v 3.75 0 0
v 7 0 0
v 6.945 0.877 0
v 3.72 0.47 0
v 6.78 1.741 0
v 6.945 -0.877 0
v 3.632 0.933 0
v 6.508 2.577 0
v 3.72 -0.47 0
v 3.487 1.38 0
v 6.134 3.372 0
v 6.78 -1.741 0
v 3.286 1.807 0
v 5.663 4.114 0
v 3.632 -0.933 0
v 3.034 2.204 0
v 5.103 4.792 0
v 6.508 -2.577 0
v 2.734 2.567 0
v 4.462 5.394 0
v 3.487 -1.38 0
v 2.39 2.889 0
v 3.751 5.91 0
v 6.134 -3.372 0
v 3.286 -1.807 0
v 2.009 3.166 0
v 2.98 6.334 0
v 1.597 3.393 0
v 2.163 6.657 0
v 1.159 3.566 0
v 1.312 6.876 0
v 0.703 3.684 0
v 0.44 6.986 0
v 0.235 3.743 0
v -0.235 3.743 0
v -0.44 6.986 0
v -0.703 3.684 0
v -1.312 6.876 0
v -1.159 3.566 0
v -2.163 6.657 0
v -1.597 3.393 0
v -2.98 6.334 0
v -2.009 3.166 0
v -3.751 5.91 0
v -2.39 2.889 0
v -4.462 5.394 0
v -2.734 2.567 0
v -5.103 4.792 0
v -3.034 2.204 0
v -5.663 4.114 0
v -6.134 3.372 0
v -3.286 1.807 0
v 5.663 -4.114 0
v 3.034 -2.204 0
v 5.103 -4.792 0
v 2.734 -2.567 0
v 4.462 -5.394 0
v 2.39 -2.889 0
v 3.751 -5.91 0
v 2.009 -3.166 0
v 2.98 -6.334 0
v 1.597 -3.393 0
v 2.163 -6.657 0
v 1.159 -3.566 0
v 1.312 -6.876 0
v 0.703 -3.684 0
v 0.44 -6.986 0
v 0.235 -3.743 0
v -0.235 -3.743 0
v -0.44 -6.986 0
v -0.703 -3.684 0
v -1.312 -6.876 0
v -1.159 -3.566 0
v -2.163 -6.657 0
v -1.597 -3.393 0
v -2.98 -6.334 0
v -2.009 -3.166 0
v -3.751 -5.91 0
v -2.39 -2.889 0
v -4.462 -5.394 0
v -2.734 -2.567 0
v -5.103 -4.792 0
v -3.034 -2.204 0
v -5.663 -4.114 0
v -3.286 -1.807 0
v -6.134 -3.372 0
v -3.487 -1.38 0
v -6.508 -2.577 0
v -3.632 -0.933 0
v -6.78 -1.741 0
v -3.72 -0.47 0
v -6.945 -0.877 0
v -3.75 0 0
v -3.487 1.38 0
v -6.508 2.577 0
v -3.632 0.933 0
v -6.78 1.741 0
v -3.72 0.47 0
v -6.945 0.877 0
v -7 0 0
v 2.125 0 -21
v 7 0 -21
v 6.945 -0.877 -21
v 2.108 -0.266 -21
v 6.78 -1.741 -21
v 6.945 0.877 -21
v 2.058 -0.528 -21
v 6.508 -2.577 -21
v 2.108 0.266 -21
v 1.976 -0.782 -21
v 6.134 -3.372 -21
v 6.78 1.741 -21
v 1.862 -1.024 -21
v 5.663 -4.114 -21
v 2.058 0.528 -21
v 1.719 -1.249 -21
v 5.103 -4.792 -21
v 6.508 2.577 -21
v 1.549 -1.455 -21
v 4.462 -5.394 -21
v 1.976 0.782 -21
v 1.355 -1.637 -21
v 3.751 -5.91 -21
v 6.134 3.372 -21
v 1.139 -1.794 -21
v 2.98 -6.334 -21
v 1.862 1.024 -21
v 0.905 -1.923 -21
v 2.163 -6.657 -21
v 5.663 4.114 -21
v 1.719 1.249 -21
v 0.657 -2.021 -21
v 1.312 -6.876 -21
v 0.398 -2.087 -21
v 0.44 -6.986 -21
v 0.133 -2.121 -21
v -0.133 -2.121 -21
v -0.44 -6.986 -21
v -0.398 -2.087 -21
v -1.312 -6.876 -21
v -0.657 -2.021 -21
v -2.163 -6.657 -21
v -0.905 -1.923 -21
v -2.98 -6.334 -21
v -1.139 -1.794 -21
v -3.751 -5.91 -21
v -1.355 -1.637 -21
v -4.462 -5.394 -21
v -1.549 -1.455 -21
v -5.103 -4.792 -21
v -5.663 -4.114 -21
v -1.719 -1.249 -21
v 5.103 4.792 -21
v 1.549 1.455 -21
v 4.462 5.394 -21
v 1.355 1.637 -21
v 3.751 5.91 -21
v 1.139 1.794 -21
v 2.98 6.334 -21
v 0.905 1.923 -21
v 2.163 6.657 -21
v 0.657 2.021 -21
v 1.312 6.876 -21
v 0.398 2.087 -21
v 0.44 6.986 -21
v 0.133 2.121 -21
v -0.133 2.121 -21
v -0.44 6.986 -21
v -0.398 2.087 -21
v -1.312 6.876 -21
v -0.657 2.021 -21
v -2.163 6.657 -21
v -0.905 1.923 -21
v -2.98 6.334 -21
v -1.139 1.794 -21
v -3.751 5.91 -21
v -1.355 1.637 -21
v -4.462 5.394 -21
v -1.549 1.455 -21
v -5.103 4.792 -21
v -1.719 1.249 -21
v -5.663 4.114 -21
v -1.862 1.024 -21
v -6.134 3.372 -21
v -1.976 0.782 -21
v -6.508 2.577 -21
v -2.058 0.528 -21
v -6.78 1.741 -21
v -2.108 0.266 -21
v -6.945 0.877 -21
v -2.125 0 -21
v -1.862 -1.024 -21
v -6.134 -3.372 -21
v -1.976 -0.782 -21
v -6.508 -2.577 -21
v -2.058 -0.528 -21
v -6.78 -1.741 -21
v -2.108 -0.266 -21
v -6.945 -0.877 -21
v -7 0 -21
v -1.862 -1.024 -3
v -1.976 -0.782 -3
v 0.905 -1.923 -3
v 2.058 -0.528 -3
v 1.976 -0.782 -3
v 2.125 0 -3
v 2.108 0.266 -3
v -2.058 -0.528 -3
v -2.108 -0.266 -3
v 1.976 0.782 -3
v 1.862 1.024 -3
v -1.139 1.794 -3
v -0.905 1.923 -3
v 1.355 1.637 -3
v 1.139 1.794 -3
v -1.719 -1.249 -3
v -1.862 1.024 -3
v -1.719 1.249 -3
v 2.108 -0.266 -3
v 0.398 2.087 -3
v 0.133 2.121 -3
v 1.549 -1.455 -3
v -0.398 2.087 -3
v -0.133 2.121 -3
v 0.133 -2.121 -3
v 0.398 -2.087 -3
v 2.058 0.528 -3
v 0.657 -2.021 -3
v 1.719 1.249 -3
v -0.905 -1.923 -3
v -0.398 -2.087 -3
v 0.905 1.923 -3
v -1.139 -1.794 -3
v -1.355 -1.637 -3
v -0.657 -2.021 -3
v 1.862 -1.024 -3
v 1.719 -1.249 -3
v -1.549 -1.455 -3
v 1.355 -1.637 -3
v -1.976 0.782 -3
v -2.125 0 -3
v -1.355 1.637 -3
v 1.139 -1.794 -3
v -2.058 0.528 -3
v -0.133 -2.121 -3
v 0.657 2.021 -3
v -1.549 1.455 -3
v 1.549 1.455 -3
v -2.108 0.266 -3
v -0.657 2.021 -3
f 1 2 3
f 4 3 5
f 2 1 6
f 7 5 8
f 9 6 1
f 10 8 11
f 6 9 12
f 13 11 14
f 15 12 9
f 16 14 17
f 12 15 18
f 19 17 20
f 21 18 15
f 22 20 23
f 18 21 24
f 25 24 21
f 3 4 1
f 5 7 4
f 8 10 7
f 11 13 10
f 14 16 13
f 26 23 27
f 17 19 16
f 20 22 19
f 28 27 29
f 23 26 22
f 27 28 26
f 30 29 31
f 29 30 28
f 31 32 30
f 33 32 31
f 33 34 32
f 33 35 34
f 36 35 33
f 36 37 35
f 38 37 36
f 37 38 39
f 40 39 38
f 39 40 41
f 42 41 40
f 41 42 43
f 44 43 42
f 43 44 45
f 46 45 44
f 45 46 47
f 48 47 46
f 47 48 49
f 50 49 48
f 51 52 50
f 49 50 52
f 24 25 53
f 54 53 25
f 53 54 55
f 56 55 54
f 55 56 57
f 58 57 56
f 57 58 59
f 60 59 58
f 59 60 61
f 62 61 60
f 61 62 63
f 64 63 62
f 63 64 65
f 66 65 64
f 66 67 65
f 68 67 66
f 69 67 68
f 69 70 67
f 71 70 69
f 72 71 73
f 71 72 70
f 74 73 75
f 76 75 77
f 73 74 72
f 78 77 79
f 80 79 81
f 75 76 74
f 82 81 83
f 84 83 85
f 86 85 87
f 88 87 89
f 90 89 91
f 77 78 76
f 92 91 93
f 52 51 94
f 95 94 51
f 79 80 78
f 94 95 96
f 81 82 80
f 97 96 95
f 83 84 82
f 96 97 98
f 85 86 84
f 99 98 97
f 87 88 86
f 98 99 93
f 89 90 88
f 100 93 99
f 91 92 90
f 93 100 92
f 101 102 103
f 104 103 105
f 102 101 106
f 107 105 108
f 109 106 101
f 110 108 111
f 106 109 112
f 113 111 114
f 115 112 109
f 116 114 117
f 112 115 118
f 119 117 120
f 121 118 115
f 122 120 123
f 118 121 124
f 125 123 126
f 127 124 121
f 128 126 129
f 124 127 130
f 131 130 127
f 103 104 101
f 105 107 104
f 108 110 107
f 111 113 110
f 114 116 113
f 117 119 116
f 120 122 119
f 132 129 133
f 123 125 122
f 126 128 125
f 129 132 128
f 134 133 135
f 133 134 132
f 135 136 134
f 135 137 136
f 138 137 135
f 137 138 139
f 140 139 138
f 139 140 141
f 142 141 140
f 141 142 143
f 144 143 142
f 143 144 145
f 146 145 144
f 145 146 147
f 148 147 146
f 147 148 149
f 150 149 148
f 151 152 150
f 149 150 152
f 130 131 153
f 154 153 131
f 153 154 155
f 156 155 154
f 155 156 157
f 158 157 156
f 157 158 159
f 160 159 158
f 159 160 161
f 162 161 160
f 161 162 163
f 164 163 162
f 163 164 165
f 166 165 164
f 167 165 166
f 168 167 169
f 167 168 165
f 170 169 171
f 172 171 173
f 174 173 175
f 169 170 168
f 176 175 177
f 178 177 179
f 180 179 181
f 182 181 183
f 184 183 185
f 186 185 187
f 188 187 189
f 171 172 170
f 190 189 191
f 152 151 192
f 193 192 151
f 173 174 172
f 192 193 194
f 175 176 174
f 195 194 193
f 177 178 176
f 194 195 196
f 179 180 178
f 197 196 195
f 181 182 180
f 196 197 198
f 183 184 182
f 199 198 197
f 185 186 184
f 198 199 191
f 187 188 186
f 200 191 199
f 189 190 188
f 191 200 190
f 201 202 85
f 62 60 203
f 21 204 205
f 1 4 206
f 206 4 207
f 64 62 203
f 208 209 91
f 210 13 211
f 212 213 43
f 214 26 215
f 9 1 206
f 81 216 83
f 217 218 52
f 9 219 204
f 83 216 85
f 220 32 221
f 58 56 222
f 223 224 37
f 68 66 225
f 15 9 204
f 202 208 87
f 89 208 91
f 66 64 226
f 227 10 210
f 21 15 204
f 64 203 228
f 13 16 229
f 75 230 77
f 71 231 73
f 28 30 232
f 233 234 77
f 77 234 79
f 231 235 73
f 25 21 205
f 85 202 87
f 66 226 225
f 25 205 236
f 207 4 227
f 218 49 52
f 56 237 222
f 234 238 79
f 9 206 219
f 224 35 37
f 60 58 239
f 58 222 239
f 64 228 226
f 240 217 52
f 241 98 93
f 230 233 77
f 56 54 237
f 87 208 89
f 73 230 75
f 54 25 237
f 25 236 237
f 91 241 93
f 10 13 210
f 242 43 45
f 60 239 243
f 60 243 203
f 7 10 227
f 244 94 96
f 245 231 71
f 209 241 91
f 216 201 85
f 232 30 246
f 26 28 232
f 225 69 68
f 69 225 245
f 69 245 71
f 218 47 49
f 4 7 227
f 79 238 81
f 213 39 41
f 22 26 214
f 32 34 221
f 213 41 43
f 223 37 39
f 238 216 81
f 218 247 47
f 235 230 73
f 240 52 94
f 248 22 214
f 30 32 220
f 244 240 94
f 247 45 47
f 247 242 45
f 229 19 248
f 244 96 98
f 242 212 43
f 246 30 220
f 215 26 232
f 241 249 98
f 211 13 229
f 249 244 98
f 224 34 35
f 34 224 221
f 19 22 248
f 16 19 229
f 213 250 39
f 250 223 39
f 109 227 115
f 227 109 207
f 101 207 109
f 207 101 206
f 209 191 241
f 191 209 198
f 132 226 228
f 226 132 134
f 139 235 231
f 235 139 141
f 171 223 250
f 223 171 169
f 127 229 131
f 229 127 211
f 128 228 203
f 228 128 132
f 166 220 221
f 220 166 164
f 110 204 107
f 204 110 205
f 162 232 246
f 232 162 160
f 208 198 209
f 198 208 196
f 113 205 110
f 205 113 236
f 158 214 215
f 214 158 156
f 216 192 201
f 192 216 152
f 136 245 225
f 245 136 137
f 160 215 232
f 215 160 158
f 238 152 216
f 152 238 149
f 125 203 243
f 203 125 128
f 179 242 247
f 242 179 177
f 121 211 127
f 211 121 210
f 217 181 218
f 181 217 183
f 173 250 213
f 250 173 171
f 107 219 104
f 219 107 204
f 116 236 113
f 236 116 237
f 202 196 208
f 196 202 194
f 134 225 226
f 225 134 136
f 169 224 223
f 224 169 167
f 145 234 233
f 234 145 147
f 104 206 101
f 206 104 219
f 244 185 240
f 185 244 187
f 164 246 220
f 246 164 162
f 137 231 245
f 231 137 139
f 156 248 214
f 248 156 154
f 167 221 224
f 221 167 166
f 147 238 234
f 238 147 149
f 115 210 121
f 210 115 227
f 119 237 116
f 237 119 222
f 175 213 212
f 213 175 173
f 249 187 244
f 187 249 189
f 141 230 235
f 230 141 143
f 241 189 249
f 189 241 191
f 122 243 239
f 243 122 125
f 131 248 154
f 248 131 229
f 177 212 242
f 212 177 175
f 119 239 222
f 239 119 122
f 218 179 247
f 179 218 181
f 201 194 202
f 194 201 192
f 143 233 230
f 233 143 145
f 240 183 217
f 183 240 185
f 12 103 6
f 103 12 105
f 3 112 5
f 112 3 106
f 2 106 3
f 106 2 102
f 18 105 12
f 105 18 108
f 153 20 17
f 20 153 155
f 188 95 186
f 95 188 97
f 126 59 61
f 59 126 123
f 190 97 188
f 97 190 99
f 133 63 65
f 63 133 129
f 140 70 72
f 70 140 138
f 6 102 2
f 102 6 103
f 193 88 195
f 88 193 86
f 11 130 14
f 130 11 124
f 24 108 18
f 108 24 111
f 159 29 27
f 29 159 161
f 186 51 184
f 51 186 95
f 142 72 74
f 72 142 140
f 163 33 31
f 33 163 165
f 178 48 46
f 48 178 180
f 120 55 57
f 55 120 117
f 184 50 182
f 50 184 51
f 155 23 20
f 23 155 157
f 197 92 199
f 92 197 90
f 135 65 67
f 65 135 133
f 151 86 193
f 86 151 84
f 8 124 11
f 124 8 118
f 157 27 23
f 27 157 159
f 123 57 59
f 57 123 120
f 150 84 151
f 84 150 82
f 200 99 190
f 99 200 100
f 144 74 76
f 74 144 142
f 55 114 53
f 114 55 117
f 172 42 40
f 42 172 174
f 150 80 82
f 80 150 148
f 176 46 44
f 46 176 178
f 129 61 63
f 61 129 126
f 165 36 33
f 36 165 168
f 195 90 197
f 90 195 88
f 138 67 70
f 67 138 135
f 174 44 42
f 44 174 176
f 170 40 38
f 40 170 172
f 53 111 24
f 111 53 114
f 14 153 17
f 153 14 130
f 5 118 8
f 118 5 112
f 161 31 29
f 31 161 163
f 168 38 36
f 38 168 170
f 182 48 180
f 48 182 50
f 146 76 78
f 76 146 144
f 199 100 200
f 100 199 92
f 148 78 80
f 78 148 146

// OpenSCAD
$fn = 50;


difference() {
	union() {
		translate(v = [0, 0, -21.0000000000]) {
			cylinder(h = 21, r = 7.0000000000);
		}
		cylinder(h = 0, r = 13.0000000000);
	}
	union() {
		translate(v = [0, 0, 0]) {
			rotate(a = [0, 0, 0]) {
				difference() {
					union() {
						#translate(v = [0, 0, -21.0000000000]) {
							cylinder(h = 21, r = 2.0000000000);
						}
						#translate(v = [0, 0, -3]) {
							cylinder(h = 3, r1 = 2.1250000000, r2 = 3.7500000000);
						}
						#translate(v = [0, 0, -21.0000000000]) {
							cylinder(h = 21, r = 2.1250000000);
						}
						#translate(v = [0, 0, -21.0000000000]) {
							cylinder(h = 21, r = 2.0000000000);
						}
					}
					union();
				}
			}
		}
	}
}
